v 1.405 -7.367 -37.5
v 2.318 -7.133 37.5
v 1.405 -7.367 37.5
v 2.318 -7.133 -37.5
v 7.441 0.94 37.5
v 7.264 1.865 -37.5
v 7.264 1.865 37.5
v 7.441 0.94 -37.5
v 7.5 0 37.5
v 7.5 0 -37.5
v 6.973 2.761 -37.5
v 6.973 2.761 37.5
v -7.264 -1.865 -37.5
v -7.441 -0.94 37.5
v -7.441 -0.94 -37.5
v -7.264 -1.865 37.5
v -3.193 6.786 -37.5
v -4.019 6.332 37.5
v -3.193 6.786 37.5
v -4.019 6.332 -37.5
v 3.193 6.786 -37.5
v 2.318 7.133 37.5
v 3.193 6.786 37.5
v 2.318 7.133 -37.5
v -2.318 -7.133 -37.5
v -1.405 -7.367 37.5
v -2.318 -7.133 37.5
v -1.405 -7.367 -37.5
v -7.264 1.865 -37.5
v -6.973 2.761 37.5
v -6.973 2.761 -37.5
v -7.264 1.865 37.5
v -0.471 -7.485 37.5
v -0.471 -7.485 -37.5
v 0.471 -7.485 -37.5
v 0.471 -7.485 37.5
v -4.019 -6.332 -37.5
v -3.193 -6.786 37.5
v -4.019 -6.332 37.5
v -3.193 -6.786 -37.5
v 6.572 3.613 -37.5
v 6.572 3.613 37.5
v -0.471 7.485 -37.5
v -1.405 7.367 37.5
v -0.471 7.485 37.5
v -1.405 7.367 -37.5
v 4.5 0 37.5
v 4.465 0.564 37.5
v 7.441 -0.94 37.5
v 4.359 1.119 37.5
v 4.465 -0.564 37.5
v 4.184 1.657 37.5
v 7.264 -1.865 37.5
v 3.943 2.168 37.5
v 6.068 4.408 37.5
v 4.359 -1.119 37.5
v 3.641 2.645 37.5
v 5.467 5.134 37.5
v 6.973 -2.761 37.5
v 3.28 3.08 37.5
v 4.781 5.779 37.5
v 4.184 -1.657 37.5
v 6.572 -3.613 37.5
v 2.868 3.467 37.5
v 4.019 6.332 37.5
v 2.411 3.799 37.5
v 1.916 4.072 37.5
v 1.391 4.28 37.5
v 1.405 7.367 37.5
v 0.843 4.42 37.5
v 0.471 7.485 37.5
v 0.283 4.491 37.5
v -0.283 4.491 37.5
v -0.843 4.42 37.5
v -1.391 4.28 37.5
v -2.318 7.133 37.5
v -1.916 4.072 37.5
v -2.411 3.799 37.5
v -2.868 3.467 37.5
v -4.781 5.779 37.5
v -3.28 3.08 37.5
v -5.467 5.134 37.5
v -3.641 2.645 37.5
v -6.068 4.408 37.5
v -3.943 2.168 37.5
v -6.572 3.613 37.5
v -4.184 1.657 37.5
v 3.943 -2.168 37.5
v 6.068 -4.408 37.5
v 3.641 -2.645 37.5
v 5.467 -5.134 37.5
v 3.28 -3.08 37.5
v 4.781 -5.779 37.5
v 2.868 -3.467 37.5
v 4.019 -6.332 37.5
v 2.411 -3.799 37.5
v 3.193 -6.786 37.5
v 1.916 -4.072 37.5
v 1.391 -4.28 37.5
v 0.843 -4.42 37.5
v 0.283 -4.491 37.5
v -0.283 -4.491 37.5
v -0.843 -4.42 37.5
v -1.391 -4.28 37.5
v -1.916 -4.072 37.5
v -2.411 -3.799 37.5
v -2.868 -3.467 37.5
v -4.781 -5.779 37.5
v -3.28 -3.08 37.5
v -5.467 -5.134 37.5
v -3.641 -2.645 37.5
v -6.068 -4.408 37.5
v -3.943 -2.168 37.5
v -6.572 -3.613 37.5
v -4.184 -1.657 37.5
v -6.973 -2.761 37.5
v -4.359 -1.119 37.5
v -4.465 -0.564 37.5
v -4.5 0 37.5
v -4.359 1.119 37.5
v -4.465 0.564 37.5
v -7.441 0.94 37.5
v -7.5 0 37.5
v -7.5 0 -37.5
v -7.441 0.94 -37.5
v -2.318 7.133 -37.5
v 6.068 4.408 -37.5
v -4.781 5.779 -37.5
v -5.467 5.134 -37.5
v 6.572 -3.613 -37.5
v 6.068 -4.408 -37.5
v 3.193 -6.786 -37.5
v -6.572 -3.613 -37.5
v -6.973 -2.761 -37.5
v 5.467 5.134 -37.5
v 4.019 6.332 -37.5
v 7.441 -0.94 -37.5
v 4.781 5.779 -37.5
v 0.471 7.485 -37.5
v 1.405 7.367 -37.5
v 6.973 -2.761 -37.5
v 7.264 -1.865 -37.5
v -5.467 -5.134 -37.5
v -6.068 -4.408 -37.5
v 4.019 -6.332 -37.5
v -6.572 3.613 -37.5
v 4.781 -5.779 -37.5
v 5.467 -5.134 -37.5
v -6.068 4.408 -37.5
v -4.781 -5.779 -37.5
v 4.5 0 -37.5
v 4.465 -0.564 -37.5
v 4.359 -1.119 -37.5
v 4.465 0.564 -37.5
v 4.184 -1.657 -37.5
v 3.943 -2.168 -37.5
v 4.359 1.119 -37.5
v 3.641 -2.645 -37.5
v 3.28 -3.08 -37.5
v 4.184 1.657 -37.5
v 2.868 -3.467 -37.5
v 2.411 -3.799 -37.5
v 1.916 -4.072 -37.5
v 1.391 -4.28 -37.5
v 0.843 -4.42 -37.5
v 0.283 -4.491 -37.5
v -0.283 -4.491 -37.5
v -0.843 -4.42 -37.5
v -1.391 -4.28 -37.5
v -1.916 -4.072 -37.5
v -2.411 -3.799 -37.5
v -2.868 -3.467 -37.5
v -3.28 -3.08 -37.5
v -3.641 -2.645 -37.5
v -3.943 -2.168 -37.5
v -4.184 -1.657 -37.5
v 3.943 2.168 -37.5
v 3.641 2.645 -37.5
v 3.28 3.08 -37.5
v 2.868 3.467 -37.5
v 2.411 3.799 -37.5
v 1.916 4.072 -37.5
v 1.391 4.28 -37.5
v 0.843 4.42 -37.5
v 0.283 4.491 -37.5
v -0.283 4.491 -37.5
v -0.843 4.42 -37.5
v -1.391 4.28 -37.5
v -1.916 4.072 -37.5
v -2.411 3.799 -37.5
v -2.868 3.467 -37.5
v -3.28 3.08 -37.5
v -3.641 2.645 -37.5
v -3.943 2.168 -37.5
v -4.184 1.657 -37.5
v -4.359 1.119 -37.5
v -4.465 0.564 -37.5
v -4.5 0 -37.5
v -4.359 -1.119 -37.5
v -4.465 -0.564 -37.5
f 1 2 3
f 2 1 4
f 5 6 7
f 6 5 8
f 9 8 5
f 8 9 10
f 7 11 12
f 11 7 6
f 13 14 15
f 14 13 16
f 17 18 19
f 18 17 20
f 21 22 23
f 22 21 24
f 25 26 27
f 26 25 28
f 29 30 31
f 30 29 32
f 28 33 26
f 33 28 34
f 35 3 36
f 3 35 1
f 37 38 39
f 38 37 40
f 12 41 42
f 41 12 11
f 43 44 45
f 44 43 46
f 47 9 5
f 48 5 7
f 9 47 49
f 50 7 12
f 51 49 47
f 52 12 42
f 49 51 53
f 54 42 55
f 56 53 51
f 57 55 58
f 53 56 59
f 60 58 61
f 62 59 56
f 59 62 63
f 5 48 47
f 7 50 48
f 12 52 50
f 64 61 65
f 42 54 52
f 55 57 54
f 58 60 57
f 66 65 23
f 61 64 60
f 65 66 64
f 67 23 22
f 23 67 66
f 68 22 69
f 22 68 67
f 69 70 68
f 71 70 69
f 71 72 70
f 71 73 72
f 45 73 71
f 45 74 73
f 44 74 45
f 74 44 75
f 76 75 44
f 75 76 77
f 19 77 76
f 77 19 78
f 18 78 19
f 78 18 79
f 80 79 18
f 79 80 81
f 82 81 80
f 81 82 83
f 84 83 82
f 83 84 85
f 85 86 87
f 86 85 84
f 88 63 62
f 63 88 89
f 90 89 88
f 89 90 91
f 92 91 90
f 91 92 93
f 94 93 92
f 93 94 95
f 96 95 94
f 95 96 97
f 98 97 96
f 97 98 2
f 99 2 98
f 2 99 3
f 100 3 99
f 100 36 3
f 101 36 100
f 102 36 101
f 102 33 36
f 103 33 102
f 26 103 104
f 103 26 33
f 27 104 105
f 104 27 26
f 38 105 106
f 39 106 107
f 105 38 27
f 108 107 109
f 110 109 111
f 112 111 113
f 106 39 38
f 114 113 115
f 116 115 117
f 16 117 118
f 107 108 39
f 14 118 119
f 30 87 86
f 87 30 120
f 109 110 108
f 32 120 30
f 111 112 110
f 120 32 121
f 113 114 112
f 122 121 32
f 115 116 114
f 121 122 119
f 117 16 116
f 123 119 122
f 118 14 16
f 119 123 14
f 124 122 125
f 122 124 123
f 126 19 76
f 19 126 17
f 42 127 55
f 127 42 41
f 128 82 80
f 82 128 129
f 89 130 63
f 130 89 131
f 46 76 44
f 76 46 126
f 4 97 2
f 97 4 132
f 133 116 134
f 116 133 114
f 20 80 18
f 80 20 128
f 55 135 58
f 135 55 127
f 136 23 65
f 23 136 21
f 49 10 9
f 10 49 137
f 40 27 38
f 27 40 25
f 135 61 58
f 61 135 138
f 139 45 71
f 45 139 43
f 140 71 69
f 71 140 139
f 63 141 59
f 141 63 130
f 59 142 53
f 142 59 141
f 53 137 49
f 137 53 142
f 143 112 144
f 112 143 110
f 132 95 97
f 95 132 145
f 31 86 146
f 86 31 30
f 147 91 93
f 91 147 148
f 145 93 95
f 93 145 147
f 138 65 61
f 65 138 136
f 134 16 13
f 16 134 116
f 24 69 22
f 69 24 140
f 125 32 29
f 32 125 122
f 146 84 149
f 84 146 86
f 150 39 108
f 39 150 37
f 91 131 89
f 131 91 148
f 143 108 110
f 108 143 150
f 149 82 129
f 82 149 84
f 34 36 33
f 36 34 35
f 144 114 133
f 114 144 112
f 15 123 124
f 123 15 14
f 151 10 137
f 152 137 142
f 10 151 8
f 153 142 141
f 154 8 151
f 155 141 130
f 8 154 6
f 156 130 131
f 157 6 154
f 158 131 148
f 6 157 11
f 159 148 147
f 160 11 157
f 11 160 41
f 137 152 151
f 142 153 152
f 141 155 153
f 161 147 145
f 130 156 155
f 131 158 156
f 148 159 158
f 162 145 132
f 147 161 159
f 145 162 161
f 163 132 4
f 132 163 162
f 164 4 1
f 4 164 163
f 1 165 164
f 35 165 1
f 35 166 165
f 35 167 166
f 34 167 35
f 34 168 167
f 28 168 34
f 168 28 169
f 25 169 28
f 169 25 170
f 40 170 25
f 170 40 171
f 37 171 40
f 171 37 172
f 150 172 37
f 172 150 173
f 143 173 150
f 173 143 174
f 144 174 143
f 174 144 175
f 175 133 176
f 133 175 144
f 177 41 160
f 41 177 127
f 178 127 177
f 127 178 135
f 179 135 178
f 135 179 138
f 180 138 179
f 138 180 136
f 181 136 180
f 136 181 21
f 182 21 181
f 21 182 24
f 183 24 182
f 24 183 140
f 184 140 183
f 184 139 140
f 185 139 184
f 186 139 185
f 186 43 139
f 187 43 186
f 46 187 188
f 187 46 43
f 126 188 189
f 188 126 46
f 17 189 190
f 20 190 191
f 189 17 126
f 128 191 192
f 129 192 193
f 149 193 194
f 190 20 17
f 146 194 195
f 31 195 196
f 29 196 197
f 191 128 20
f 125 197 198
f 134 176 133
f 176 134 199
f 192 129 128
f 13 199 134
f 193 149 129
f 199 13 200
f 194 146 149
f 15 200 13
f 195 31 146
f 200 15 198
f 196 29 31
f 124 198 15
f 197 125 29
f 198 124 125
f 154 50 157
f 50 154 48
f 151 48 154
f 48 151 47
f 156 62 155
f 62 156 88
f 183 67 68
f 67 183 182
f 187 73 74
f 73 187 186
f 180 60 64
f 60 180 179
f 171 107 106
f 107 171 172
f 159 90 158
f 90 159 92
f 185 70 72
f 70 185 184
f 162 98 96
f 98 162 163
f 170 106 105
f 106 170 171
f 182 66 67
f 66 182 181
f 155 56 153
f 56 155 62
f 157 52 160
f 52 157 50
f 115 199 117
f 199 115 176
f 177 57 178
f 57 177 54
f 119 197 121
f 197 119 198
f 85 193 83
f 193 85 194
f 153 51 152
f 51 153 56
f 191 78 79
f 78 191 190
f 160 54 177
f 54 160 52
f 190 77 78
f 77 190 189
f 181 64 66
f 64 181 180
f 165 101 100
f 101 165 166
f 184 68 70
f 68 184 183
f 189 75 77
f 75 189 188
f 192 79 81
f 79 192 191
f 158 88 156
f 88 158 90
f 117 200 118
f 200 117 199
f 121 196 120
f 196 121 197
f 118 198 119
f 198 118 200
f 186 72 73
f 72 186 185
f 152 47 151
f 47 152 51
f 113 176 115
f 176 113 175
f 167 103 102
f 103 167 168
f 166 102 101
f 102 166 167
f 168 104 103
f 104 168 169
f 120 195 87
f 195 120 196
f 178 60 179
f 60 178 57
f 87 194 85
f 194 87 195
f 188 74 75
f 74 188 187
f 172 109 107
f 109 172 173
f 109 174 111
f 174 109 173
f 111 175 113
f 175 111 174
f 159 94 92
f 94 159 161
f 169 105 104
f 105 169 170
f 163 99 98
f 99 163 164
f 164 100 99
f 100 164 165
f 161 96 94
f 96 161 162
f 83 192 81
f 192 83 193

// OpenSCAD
$fn = 50;


difference() {
	union() {
		translate(v = [0, 0, -37.5000000000]) {
			cylinder(h = 75, r = 7.5000000000);
		}
	}
	union() {
		translate(v = [0, 0, -100.0000000000]) {
			cylinder(h = 200, r = 4.5000000000);
		}
	}
}
